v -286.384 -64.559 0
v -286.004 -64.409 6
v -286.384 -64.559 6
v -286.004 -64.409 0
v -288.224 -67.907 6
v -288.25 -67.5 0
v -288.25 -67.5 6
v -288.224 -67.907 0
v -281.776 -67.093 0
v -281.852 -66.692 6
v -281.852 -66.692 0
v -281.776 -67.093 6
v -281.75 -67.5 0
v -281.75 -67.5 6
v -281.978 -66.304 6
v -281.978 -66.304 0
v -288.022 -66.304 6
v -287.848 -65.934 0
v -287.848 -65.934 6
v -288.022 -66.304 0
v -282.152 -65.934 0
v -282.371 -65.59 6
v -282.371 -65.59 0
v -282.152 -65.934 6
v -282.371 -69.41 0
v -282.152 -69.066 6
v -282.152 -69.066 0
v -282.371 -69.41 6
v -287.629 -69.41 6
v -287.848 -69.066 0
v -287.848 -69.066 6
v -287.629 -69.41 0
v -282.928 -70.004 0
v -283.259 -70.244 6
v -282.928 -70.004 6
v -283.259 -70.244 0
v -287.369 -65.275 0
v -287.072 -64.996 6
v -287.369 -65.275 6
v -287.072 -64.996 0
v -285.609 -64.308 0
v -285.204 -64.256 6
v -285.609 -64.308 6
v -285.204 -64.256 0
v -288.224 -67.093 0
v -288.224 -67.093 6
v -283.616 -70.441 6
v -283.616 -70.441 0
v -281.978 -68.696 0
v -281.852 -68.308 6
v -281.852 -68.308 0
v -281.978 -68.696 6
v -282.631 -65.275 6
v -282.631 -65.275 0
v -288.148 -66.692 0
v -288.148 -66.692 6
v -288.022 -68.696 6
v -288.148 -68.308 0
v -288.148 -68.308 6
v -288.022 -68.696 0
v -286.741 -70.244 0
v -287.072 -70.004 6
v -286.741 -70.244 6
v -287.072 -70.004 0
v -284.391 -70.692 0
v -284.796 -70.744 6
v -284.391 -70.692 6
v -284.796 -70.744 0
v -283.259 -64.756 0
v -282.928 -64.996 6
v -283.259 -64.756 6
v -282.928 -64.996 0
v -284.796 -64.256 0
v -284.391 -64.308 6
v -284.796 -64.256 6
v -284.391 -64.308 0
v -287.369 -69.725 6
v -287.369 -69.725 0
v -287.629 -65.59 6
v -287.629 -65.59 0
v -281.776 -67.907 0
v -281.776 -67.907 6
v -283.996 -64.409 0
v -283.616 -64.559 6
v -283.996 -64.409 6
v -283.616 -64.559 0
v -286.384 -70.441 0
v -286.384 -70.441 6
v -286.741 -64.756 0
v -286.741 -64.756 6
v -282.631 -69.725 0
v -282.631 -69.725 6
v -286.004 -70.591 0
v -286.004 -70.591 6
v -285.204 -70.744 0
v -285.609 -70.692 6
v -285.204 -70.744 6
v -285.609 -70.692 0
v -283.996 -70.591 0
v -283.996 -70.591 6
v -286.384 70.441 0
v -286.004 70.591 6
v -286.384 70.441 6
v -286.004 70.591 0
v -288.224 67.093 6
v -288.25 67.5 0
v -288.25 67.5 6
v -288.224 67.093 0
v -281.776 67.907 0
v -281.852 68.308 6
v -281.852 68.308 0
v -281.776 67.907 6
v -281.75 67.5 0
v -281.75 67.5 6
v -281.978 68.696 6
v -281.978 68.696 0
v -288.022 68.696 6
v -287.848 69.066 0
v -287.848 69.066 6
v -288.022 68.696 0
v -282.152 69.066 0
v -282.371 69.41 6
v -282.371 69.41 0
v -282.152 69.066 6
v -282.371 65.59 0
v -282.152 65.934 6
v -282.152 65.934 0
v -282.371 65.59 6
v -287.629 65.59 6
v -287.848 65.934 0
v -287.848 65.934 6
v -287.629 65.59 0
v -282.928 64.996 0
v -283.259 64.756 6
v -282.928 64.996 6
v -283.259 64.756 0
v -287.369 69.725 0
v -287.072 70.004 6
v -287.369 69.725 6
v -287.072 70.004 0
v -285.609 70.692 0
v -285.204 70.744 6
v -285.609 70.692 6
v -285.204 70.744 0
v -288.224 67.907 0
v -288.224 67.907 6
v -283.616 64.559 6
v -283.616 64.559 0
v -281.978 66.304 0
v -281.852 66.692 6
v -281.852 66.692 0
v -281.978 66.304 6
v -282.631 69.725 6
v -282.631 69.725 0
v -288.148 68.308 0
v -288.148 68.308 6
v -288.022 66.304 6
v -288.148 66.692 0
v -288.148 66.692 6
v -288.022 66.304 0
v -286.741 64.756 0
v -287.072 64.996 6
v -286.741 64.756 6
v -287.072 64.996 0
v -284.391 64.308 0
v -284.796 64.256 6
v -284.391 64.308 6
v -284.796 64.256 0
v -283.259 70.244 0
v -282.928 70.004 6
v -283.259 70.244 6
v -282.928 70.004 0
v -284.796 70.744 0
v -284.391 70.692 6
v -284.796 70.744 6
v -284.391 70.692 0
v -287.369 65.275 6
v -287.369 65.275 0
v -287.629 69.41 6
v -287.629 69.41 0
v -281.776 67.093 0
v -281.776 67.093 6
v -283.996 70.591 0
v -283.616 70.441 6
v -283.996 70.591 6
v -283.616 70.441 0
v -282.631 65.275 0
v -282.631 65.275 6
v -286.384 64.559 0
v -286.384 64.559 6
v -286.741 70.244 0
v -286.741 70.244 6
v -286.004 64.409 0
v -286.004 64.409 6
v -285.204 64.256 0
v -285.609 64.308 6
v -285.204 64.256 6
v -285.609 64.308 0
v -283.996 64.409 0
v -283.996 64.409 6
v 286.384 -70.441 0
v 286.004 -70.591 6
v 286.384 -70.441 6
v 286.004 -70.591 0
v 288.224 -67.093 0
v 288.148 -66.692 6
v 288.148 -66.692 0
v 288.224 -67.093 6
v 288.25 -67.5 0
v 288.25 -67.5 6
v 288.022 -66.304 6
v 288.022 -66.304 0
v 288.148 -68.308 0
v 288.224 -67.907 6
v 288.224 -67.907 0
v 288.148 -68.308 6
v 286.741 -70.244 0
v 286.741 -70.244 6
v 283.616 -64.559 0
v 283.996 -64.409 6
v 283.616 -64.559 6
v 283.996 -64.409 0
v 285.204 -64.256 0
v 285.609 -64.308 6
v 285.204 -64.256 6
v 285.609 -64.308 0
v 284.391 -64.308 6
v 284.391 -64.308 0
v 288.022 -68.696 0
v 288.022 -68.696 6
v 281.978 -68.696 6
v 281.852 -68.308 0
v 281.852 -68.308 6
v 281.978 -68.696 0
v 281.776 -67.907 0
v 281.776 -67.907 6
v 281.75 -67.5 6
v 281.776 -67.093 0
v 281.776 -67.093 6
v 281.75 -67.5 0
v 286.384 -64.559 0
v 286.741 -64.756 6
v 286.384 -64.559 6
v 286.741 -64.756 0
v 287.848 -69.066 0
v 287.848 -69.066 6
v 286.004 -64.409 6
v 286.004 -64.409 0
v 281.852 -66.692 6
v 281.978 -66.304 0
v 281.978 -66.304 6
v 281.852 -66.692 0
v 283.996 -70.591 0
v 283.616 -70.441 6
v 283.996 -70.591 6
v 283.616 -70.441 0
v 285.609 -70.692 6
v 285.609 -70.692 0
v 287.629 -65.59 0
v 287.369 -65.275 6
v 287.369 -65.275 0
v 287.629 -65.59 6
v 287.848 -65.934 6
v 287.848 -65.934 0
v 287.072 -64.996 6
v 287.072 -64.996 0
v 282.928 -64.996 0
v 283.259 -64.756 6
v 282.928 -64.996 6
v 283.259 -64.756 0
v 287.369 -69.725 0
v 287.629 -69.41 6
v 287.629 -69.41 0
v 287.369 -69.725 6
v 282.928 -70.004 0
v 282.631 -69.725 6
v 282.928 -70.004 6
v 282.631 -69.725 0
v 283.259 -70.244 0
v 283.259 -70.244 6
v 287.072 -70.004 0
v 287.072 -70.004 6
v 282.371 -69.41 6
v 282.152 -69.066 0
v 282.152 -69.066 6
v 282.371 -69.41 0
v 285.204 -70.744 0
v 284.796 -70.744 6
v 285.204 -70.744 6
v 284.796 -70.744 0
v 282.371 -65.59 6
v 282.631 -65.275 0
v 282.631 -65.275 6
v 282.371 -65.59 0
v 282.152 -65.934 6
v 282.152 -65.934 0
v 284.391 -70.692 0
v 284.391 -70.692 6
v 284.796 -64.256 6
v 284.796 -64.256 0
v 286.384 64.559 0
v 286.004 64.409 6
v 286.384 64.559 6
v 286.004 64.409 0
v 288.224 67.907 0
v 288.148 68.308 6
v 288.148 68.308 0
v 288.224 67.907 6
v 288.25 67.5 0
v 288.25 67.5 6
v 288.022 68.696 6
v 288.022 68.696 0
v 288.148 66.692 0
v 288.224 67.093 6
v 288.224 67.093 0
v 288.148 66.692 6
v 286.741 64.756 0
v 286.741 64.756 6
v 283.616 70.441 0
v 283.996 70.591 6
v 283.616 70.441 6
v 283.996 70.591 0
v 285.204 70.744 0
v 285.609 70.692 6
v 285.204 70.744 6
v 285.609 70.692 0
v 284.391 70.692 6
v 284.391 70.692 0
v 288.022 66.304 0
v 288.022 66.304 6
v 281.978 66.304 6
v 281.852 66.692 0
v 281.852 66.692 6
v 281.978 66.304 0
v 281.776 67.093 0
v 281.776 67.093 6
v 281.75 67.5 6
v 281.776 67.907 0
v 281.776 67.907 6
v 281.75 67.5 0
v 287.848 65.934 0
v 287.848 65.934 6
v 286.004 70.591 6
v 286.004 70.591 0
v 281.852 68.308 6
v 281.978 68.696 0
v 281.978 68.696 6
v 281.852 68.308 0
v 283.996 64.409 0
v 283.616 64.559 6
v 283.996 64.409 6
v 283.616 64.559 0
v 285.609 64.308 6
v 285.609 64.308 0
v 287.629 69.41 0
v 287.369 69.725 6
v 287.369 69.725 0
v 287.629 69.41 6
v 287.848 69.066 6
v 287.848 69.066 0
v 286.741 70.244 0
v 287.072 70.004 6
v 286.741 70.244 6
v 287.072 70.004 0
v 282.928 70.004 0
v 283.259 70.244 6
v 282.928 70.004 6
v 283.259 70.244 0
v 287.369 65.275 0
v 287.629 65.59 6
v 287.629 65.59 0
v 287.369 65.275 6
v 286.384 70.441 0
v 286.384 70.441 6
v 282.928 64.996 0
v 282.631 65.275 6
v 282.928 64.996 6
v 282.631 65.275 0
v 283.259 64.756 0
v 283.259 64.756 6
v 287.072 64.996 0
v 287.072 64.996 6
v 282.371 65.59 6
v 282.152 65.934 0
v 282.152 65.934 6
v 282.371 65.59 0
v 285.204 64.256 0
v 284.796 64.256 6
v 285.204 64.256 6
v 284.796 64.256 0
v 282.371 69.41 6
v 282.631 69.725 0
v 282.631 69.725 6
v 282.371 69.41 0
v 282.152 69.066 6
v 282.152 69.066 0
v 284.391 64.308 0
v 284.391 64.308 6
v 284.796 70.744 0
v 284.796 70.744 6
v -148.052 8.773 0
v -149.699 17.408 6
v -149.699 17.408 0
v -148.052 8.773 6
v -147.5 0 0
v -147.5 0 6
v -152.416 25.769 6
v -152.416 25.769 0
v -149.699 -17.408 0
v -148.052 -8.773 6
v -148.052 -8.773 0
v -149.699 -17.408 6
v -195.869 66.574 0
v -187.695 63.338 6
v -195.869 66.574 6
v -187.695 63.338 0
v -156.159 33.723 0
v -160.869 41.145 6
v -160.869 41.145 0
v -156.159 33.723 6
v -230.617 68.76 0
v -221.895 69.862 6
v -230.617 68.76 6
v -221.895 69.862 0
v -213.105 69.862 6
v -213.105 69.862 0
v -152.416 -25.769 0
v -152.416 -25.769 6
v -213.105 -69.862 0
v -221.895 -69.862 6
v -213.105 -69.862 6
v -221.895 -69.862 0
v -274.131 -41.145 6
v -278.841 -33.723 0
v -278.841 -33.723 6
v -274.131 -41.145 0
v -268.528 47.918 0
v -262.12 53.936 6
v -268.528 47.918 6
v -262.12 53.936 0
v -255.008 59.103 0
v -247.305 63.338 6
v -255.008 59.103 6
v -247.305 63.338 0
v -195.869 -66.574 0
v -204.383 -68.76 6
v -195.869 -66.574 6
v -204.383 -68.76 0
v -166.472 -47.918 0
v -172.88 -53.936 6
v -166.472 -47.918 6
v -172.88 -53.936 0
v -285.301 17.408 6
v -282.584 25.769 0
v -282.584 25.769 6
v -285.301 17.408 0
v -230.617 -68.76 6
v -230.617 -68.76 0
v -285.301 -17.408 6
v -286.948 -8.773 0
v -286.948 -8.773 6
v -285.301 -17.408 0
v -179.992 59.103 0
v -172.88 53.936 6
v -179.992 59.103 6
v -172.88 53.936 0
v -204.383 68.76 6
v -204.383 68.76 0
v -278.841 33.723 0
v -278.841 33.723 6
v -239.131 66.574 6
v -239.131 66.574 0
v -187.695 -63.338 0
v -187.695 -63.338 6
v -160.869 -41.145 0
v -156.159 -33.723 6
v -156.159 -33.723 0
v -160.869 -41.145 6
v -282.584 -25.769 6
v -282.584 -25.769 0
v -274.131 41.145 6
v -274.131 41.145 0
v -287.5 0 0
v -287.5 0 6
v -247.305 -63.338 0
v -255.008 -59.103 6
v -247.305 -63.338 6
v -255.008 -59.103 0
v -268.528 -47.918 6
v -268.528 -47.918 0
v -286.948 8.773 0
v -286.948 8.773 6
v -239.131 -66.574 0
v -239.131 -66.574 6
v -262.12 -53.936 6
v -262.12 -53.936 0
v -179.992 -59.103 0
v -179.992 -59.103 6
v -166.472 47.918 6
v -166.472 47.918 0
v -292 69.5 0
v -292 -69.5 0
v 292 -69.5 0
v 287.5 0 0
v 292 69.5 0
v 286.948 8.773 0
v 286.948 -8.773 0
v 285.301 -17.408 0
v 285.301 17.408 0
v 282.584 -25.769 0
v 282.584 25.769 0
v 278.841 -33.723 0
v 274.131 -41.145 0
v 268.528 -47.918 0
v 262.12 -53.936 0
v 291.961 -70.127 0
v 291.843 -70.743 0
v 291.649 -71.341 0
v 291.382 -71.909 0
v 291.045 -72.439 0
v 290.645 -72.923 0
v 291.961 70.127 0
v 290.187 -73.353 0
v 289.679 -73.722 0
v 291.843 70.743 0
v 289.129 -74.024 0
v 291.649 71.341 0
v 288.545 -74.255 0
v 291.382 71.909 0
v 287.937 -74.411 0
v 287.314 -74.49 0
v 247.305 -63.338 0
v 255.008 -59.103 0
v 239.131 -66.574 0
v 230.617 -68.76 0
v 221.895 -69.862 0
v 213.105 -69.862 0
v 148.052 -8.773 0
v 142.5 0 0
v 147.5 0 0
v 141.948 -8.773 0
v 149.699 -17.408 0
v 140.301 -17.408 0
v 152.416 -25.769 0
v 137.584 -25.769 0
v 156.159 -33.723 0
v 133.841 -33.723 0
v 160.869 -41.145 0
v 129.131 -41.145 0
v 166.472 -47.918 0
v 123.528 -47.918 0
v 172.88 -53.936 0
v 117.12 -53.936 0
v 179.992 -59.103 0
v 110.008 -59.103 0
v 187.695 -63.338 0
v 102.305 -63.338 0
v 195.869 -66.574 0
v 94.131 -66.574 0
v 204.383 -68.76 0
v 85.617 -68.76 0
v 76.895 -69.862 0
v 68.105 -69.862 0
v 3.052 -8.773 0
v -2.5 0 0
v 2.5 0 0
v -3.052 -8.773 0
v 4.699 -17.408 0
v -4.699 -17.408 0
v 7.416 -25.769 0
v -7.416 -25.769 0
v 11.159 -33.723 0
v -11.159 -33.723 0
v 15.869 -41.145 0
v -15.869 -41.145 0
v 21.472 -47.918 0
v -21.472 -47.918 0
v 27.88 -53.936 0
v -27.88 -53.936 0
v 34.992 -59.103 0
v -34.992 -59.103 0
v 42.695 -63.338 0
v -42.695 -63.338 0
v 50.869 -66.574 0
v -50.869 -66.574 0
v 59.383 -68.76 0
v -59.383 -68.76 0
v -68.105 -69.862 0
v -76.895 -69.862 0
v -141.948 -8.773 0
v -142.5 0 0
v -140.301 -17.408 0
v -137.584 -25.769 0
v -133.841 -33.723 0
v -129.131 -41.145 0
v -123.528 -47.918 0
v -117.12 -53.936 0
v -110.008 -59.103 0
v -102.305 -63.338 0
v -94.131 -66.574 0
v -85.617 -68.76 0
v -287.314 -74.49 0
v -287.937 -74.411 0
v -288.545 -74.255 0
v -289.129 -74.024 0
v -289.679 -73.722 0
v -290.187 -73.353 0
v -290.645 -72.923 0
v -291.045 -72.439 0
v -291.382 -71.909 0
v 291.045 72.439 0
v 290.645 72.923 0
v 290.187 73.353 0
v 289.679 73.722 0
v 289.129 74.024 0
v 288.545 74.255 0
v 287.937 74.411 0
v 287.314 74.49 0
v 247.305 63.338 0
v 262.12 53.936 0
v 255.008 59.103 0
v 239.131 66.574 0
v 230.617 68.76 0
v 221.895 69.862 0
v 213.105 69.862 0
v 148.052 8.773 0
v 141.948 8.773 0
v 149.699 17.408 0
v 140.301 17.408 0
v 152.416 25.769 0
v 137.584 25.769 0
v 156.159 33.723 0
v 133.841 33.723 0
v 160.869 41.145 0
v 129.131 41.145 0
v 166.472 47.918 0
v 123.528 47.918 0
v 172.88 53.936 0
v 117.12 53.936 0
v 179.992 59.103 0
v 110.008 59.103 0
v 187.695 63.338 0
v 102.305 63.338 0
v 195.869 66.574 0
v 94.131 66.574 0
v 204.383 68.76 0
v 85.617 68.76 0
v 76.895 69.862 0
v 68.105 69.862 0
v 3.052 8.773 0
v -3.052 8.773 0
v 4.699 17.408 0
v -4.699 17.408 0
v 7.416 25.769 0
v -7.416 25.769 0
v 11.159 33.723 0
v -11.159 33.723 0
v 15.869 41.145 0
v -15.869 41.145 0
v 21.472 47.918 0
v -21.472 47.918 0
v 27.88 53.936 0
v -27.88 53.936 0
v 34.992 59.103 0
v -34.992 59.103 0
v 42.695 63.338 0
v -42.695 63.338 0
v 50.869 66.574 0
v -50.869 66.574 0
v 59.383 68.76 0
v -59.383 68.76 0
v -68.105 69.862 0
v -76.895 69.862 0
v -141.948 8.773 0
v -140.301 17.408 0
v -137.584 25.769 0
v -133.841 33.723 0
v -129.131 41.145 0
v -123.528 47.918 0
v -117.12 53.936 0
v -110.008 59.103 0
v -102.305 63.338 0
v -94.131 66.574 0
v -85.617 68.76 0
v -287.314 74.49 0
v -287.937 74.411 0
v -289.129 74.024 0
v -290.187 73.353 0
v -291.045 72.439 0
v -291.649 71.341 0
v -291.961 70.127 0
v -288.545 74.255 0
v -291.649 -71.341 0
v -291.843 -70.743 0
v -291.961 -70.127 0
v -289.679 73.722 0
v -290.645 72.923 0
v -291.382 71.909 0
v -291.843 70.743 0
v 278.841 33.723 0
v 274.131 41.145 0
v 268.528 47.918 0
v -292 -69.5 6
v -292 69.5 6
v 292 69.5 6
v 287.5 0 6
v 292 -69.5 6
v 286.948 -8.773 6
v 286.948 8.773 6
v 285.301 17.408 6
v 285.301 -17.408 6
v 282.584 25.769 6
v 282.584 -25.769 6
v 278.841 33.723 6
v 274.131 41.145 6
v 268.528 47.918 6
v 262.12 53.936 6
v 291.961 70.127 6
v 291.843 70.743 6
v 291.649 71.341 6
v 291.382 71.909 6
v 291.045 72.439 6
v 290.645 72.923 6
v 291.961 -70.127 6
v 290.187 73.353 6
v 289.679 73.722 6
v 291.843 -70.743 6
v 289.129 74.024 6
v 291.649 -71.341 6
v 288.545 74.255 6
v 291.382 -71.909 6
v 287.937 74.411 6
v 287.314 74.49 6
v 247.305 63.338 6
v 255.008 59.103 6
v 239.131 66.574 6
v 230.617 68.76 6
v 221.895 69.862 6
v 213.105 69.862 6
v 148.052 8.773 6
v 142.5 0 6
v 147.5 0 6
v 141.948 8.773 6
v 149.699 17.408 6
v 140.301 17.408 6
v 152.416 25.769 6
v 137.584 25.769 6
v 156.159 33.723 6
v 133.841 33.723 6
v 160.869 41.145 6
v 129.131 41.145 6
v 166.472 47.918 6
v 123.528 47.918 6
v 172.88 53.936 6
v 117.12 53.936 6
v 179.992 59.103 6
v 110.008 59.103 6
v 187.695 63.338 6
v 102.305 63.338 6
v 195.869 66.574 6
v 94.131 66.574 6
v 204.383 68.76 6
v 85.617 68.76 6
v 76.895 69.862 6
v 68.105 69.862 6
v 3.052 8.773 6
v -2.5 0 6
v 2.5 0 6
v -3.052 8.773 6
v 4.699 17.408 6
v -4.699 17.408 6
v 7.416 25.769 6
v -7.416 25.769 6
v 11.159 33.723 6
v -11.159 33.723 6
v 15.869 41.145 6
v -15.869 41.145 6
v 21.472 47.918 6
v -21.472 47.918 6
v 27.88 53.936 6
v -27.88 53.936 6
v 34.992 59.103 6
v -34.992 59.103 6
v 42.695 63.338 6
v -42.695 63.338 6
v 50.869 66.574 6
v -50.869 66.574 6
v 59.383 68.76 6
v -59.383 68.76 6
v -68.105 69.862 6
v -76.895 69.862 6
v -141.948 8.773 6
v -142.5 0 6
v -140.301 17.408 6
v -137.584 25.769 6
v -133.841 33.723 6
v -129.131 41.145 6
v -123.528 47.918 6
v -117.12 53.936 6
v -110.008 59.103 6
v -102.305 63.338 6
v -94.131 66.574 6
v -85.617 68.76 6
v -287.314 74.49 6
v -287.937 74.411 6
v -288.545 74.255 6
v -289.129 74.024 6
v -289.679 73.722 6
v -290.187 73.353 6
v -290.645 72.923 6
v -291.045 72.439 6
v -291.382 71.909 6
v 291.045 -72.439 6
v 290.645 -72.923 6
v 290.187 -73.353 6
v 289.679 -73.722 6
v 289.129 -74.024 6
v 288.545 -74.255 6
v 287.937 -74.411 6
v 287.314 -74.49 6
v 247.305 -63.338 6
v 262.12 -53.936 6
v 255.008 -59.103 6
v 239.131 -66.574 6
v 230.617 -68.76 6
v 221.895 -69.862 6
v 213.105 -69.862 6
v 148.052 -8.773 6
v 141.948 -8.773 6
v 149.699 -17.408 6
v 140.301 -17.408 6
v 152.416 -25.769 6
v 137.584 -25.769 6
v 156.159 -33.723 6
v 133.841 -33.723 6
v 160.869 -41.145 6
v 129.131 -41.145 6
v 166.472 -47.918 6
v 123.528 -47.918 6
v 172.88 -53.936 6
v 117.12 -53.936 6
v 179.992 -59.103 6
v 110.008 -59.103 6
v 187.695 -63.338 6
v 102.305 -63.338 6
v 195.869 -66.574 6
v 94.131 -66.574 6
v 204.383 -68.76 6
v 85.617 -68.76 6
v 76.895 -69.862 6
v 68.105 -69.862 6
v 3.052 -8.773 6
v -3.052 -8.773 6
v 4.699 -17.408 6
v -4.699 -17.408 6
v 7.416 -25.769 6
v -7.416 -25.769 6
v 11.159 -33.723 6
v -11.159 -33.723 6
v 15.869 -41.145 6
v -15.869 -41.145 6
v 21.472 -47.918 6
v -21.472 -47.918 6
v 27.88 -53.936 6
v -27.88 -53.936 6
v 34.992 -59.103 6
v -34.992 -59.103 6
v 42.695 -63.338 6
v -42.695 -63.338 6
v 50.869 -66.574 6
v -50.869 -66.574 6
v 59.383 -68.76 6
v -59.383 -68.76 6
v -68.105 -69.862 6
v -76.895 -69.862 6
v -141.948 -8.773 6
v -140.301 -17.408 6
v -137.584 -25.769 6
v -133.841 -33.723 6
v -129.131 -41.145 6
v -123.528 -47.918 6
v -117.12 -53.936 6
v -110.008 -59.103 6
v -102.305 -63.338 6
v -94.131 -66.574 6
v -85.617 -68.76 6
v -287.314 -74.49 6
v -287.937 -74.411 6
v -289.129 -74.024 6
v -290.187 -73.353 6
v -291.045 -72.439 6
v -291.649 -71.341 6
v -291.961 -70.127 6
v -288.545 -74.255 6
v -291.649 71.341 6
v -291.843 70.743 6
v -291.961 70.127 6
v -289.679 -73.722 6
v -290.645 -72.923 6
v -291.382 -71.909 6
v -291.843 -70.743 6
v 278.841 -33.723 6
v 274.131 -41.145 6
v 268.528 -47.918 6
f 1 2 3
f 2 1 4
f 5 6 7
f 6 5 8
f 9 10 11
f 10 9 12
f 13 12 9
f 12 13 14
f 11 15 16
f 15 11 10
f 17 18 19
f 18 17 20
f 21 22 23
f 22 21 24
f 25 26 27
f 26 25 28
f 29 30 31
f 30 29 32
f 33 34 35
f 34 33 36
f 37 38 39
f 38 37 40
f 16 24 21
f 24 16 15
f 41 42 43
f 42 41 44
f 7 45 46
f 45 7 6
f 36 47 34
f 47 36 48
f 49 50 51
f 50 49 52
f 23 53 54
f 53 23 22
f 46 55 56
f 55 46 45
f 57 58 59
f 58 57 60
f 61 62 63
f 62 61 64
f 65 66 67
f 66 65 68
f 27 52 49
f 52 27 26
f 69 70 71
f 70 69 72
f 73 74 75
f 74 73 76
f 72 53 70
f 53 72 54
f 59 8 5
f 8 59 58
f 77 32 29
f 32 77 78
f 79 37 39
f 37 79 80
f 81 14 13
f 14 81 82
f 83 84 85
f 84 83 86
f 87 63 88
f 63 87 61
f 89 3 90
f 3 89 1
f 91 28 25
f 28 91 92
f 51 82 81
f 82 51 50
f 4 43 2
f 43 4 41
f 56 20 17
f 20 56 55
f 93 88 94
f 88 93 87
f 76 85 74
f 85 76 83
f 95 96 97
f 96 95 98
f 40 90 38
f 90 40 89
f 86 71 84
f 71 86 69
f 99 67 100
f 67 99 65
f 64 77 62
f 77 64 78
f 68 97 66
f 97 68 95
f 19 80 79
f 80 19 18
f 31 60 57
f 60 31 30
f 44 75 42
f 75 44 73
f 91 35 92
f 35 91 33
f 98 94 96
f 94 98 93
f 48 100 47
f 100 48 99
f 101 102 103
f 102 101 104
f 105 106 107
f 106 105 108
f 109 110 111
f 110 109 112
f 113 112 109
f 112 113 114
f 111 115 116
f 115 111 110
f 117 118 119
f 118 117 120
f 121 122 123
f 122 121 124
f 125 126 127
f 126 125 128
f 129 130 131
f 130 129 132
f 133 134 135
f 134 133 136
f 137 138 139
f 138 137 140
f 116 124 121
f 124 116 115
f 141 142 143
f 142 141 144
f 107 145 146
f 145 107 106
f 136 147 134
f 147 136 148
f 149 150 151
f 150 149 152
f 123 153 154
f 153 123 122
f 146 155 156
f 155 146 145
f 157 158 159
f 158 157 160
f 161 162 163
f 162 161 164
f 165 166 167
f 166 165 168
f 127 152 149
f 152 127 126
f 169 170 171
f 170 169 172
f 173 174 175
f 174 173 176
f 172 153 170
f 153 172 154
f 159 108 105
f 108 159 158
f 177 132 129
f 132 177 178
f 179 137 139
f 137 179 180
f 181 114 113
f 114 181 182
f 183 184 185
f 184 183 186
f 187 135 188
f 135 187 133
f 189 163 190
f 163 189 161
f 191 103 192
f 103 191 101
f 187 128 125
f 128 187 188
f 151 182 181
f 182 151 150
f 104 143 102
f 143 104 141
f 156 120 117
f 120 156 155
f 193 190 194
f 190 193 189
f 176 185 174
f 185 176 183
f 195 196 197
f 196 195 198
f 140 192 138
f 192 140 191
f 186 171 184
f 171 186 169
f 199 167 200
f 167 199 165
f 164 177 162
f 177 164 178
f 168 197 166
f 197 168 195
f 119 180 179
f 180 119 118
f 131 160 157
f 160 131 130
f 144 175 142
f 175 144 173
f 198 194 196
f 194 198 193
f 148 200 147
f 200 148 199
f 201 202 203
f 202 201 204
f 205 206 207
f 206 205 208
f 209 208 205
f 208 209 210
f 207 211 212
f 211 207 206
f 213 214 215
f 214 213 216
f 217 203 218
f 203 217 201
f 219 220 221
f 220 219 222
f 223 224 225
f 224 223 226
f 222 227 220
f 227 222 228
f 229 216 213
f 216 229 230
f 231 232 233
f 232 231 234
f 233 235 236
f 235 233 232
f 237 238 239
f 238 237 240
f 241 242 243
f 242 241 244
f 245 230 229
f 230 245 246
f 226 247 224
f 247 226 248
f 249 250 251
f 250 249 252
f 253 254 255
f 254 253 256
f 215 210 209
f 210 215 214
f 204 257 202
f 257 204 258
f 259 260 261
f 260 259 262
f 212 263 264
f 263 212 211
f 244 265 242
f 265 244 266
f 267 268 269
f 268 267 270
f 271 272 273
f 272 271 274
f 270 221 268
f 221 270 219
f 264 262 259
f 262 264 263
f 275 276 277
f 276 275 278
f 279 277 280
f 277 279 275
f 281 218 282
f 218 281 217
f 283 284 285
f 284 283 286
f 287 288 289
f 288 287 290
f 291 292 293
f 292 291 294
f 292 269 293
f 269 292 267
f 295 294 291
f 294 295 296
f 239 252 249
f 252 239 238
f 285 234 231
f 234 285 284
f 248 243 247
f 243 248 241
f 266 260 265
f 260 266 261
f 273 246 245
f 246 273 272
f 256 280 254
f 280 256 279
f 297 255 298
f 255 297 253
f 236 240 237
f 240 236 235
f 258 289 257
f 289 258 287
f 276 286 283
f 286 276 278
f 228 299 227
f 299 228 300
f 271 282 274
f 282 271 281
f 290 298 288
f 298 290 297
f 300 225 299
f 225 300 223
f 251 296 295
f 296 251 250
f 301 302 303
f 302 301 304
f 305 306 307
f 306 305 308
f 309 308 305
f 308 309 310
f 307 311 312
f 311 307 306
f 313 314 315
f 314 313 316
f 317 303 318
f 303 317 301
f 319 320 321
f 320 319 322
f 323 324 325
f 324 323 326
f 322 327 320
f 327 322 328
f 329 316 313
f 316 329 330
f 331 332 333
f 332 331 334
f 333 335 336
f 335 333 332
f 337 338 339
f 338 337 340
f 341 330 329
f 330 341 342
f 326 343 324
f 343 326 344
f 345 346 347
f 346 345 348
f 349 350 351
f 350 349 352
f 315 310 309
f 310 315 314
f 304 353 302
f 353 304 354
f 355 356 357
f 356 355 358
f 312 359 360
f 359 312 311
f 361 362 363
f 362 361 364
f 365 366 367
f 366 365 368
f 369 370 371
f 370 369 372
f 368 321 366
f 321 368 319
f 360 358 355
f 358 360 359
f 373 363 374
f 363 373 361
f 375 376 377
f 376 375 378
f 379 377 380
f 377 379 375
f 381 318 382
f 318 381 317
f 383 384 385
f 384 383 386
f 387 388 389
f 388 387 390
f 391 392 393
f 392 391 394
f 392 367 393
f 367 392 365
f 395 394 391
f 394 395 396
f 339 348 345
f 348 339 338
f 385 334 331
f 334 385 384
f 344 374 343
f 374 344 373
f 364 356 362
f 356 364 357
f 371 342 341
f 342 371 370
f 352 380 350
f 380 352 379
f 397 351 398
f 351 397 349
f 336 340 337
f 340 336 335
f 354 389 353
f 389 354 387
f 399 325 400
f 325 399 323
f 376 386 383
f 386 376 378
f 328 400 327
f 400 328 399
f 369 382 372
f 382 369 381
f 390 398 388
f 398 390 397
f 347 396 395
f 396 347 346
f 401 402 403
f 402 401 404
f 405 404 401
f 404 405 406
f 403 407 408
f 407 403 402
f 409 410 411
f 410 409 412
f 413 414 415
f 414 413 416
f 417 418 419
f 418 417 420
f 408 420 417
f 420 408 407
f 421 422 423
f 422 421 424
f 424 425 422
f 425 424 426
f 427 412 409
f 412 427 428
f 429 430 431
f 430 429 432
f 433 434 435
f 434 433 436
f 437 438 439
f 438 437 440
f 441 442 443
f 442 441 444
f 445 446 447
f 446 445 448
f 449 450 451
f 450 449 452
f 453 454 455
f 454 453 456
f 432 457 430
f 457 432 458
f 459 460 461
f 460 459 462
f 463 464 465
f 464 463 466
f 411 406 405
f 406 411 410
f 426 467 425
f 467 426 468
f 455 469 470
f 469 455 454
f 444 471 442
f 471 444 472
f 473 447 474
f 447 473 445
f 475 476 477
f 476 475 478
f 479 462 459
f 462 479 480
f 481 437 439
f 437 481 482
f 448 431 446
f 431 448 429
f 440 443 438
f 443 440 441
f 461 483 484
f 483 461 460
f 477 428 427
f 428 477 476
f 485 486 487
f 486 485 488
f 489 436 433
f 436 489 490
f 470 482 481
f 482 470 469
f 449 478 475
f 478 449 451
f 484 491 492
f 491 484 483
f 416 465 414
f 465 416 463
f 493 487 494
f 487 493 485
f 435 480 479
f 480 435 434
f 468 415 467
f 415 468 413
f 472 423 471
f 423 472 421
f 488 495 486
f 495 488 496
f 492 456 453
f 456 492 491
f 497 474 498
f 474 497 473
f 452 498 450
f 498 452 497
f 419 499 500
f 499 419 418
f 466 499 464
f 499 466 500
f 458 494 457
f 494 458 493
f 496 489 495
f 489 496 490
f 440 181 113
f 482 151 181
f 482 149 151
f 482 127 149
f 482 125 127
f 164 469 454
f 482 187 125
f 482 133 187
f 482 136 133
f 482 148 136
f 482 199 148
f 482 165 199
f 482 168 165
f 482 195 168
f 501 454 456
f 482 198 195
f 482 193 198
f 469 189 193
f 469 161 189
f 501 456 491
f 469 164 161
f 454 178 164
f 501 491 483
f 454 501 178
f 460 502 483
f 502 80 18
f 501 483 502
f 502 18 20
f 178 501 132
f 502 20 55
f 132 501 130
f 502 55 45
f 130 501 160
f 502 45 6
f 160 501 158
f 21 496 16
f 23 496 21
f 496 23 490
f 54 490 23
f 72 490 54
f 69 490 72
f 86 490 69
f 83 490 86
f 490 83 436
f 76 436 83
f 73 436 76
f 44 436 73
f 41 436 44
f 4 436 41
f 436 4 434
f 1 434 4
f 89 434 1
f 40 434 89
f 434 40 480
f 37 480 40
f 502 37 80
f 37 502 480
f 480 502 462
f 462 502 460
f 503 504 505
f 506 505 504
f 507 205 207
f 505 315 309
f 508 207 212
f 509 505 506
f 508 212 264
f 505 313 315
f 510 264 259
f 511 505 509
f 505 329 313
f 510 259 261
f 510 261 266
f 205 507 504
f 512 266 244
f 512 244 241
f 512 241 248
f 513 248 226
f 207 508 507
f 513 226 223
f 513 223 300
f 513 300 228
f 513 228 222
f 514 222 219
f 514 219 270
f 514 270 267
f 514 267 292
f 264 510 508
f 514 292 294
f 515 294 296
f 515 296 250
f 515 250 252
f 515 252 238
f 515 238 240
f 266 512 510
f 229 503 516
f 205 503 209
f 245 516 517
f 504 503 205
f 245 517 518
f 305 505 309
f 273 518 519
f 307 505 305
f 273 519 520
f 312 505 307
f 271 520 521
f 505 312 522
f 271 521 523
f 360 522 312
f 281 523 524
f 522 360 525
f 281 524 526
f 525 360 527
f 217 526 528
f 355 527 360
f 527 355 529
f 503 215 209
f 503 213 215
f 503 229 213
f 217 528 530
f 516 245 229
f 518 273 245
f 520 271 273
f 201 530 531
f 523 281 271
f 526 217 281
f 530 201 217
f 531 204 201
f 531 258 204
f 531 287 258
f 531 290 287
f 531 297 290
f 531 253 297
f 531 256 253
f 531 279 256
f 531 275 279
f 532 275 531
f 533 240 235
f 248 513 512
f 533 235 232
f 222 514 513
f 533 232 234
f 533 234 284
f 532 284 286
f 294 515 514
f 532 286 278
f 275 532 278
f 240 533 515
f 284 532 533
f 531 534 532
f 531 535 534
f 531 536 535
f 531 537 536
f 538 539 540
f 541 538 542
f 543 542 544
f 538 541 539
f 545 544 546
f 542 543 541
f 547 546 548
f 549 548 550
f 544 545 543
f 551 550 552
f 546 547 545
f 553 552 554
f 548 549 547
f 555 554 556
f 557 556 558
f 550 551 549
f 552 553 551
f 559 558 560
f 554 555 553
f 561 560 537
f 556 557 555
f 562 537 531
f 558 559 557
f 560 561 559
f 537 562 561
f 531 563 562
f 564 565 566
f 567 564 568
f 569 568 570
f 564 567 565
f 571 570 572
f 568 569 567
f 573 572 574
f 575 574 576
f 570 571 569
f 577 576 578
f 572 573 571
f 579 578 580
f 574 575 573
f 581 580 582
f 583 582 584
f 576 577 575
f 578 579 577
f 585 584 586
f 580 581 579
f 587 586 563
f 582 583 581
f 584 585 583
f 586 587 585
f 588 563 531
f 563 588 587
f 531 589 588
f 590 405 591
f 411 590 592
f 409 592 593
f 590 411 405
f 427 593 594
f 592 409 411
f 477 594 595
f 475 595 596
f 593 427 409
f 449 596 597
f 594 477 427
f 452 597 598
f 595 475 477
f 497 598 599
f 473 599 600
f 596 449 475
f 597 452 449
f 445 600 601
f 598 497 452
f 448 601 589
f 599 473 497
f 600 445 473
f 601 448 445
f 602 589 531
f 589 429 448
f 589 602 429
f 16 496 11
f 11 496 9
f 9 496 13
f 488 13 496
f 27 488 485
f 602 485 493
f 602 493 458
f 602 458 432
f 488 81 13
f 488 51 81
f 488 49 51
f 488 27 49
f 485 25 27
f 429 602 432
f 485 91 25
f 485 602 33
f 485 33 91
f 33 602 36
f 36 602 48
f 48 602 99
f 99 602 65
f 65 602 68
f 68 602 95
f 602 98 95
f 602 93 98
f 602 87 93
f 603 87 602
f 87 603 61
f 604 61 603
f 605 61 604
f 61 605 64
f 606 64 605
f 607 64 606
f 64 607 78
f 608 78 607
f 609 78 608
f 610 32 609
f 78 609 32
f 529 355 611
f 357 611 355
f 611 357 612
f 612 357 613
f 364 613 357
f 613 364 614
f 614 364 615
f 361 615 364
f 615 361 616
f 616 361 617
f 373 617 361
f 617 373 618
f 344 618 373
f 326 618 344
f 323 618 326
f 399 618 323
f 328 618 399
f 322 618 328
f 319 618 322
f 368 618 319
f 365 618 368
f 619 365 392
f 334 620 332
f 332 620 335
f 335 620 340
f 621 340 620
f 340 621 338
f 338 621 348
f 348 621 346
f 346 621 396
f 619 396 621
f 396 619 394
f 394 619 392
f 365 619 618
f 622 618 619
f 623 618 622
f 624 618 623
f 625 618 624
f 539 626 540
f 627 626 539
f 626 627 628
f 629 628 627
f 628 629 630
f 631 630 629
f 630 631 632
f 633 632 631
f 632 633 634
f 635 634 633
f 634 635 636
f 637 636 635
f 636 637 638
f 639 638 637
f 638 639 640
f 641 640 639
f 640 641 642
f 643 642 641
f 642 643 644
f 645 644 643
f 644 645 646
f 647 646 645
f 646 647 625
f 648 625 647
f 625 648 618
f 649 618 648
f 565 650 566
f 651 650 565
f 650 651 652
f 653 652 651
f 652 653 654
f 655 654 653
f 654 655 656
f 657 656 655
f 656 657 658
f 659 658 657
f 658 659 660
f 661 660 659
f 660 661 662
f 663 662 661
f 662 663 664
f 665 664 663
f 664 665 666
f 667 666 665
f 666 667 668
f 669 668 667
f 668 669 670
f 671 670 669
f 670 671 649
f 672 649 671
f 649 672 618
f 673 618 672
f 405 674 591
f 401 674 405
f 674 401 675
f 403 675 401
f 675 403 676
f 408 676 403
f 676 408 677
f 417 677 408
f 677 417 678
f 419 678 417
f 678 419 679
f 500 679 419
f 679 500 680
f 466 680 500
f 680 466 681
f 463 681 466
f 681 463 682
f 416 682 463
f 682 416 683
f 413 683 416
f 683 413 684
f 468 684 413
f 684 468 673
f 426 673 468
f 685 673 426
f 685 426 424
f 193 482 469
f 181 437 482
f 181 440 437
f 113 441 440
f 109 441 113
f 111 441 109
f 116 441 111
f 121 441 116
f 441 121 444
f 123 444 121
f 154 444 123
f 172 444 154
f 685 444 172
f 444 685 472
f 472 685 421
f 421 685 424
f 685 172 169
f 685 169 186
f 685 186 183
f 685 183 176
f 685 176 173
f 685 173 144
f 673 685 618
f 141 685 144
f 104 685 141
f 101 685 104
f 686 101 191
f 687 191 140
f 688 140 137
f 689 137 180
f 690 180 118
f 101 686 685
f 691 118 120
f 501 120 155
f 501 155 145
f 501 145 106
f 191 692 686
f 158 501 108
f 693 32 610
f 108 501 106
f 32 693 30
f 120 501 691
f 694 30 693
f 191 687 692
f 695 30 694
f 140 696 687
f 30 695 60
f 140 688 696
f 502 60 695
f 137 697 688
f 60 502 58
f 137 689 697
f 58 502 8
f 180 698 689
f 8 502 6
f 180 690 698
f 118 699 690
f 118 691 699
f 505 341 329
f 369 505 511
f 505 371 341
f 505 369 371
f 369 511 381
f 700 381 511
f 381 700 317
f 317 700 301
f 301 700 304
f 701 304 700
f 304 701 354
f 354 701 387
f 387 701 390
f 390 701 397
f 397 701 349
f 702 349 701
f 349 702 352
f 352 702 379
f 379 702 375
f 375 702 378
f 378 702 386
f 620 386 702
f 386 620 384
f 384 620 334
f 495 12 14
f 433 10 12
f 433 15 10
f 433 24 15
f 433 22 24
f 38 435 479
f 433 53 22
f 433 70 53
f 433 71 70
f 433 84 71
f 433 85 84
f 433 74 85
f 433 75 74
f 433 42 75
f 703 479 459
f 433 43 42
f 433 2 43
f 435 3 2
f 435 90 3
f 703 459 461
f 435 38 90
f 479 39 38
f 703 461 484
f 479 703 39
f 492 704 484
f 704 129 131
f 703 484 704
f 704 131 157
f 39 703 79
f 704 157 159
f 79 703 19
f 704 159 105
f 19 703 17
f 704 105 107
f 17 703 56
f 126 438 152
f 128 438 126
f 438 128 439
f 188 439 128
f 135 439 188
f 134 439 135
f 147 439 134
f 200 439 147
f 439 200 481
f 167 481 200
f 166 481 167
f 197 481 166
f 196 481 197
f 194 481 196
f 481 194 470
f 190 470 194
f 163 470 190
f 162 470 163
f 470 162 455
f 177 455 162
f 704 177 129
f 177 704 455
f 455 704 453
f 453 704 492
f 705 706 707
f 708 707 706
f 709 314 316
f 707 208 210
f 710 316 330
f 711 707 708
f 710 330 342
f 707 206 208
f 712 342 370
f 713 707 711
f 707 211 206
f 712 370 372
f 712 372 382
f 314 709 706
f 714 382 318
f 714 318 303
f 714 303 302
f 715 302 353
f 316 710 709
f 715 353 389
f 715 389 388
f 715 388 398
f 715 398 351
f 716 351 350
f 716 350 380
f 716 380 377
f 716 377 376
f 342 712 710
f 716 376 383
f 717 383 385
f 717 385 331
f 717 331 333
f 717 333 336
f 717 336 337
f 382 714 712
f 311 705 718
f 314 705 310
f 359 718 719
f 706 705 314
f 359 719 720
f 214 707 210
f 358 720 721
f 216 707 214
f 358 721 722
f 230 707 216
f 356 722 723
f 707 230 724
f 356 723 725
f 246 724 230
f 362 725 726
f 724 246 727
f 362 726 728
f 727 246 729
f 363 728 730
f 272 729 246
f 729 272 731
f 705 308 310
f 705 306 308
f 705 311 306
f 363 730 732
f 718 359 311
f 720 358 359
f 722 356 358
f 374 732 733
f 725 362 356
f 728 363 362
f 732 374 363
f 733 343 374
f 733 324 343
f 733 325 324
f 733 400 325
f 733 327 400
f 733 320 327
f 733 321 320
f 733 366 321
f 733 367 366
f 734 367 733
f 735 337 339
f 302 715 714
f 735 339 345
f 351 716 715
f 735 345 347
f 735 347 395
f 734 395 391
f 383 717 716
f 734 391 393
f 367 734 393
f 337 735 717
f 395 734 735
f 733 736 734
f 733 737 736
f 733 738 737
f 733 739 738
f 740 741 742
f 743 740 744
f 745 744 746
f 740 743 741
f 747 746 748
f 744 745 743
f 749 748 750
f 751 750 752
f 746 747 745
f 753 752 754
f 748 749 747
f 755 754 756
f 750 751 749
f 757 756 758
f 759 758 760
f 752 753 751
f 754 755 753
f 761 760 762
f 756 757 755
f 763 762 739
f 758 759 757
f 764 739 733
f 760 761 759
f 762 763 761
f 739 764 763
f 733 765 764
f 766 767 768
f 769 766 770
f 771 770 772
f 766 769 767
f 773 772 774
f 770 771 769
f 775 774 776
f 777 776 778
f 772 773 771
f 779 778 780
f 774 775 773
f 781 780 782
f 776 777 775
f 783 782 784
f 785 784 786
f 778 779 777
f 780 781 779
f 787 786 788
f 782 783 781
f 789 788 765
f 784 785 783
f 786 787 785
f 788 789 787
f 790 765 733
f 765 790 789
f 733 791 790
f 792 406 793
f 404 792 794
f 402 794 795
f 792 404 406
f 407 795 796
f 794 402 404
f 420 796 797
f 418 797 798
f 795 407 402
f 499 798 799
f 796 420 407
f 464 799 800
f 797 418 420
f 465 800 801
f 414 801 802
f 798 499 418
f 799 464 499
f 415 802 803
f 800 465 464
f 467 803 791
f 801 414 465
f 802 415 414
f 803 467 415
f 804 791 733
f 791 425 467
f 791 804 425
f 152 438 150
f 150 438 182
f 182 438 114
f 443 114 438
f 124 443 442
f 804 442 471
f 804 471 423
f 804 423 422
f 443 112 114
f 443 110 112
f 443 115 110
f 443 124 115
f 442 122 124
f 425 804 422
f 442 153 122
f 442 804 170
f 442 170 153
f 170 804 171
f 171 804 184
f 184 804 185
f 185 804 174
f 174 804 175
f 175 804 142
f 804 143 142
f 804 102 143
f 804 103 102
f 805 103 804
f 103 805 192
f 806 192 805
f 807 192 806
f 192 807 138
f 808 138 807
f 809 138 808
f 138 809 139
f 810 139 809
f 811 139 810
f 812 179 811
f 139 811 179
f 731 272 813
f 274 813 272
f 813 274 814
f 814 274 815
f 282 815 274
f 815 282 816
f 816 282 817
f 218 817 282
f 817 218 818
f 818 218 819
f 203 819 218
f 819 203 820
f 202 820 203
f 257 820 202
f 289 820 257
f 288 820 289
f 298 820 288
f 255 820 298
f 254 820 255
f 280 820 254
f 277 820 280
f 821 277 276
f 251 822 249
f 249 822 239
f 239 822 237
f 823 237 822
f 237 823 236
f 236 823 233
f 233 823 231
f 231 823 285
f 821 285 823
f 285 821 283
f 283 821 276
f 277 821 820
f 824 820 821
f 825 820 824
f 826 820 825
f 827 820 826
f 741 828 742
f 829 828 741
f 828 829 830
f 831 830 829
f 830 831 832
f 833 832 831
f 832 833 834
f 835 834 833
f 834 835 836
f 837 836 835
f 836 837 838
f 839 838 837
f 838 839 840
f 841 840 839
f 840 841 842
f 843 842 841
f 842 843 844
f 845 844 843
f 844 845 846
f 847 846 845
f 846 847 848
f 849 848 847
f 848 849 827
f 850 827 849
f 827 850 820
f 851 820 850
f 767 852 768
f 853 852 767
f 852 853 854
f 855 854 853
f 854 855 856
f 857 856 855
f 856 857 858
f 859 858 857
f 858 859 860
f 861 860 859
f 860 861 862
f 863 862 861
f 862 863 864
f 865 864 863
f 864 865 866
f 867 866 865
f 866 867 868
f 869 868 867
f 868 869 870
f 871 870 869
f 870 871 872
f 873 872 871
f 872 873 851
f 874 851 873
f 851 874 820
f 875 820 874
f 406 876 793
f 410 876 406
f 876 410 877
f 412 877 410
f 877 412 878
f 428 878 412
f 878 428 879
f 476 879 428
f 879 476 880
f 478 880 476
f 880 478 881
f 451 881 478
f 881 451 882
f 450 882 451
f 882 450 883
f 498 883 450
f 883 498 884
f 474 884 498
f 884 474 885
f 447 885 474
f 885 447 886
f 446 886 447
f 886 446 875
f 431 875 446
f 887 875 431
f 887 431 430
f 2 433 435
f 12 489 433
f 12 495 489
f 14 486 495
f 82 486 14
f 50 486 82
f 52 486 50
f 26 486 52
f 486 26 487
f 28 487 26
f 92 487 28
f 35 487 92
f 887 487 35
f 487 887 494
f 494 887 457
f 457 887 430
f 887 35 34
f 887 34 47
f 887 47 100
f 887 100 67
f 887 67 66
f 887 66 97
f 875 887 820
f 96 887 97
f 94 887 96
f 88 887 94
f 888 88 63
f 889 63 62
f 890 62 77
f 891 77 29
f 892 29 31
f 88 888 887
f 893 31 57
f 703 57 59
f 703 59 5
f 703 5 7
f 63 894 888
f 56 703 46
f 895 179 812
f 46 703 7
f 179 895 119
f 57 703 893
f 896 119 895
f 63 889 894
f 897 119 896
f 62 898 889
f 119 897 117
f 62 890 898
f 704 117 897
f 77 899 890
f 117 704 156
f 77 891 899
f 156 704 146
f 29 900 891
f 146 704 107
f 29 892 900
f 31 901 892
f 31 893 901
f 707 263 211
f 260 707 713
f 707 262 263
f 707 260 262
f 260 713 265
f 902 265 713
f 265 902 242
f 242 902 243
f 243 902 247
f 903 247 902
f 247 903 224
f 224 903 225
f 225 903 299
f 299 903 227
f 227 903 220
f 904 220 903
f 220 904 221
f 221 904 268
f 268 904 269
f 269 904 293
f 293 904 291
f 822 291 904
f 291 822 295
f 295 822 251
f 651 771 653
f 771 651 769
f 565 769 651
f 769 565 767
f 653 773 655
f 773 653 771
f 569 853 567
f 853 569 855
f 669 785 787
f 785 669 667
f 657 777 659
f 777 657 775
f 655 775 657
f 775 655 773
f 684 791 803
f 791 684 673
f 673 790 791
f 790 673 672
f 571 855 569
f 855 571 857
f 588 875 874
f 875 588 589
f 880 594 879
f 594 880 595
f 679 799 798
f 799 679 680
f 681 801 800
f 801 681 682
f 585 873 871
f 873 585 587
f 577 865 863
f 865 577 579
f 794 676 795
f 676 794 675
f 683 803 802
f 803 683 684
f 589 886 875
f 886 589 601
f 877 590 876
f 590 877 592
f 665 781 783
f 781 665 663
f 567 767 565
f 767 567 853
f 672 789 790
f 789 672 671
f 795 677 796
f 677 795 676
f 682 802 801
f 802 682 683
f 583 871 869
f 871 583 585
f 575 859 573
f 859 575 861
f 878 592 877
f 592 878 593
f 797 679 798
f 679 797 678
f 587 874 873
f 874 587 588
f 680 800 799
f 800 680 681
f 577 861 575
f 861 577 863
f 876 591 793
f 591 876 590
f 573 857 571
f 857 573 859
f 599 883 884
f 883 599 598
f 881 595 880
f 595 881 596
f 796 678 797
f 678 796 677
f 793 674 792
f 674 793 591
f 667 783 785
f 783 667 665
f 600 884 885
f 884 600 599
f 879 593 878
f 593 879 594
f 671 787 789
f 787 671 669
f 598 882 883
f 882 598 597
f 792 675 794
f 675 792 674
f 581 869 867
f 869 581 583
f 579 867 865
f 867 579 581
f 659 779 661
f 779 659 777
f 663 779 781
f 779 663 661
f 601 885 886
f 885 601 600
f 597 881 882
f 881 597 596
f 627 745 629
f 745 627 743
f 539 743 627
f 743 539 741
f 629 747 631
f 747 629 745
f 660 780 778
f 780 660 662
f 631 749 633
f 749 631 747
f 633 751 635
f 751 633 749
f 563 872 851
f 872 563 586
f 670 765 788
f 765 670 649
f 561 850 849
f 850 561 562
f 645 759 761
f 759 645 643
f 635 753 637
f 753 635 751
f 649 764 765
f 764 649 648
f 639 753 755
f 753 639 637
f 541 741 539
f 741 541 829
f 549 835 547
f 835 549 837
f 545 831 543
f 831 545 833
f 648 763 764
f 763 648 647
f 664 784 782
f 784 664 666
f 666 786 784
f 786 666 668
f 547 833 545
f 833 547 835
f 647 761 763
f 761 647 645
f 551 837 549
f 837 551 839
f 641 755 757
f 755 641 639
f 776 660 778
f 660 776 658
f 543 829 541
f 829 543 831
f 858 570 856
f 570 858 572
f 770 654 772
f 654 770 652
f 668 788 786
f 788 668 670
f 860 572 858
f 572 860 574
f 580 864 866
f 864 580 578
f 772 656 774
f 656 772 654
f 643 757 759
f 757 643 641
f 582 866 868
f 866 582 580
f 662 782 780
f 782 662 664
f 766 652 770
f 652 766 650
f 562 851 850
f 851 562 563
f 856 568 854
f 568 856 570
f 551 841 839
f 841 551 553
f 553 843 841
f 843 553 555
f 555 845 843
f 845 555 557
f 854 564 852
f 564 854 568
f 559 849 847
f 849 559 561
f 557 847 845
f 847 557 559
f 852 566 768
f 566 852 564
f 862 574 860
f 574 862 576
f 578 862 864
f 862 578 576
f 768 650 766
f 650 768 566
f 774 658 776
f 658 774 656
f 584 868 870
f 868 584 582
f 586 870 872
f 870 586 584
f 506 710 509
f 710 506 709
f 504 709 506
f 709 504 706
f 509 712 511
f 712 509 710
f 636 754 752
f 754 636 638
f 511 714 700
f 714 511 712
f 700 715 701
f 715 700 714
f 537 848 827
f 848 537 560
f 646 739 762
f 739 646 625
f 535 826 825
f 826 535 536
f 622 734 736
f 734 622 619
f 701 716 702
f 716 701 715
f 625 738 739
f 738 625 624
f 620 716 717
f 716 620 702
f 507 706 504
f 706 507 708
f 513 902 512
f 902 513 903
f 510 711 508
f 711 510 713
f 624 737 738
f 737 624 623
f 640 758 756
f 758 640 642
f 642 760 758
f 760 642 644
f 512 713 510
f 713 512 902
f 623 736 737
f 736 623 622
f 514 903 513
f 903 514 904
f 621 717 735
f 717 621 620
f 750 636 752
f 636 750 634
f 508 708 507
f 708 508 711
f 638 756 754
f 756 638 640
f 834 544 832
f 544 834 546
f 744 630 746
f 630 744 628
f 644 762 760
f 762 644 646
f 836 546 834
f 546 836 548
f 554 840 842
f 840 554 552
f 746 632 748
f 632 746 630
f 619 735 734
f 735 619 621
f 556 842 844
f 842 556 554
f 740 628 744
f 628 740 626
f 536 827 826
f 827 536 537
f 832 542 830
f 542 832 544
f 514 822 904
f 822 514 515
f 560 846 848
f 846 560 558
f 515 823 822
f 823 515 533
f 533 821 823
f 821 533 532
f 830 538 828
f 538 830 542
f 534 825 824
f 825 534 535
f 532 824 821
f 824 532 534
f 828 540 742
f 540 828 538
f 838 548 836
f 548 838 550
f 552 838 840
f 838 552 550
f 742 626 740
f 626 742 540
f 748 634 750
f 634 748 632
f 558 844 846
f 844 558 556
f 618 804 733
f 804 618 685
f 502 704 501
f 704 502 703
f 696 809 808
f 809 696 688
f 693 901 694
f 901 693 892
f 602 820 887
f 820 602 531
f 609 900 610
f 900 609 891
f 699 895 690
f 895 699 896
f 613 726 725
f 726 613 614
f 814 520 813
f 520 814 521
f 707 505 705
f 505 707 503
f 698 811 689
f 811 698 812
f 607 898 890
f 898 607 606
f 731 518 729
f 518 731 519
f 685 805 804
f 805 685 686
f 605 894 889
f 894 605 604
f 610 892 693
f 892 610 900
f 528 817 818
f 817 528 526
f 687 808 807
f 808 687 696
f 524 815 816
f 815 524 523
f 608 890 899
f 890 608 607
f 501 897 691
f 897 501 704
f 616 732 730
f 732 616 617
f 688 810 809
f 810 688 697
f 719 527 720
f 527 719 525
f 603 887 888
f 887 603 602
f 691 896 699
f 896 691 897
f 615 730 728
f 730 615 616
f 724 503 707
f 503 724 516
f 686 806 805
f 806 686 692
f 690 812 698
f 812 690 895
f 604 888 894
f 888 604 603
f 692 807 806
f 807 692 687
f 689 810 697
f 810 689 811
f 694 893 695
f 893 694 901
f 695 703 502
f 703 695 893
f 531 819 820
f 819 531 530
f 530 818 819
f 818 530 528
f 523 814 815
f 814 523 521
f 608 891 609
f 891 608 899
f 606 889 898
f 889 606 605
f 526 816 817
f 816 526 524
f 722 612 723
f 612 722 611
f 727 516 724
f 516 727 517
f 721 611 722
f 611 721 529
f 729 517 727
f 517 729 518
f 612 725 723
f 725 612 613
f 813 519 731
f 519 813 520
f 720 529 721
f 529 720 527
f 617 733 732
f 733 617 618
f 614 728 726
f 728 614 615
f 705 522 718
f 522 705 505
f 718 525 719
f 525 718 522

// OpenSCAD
$fn = 50;


difference() {
	union() {
		hull() {
			translate(v = [-287.0000000000, 69.5000000000, 0]) {
				cylinder(h = 6, r = 5);
			}
			translate(v = [287.0000000000, 69.5000000000, 0]) {
				cylinder(h = 6, r = 5);
			}
			translate(v = [-287.0000000000, -69.5000000000, 0]) {
				cylinder(h = 6, r = 5);
			}
			translate(v = [287.0000000000, -69.5000000000, 0]) {
				cylinder(h = 6, r = 5);
			}
		}
	}
	union() {
		#translate(v = [-285.0000000000, -67.5000000000, -100.0000000000]) {
			cylinder(h = 200, r = 3.2500000000);
		}
		#translate(v = [-285.0000000000, 67.5000000000, -100.0000000000]) {
			cylinder(h = 200, r = 3.2500000000);
		}
		#translate(v = [285.0000000000, -67.5000000000, -100.0000000000]) {
			cylinder(h = 200, r = 3.2500000000);
		}
		#translate(v = [285.0000000000, 67.5000000000, -100.0000000000]) {
			cylinder(h = 200, r = 3.2500000000);
		}
		#translate(v = [-217.5000000000, 0, 0]) {
			cylinder(h = 6, r = 70.0000000000);
		}
		#translate(v = [-72.5000000000, 0, 0]) {
			cylinder(h = 6, r = 70.0000000000);
		}
		#translate(v = [72.5000000000, 0, 0]) {
			cylinder(h = 6, r = 70.0000000000);
		}
		#translate(v = [217.5000000000, 0, 0]) {
			cylinder(h = 6, r = 70.0000000000);
		}
	}
}
